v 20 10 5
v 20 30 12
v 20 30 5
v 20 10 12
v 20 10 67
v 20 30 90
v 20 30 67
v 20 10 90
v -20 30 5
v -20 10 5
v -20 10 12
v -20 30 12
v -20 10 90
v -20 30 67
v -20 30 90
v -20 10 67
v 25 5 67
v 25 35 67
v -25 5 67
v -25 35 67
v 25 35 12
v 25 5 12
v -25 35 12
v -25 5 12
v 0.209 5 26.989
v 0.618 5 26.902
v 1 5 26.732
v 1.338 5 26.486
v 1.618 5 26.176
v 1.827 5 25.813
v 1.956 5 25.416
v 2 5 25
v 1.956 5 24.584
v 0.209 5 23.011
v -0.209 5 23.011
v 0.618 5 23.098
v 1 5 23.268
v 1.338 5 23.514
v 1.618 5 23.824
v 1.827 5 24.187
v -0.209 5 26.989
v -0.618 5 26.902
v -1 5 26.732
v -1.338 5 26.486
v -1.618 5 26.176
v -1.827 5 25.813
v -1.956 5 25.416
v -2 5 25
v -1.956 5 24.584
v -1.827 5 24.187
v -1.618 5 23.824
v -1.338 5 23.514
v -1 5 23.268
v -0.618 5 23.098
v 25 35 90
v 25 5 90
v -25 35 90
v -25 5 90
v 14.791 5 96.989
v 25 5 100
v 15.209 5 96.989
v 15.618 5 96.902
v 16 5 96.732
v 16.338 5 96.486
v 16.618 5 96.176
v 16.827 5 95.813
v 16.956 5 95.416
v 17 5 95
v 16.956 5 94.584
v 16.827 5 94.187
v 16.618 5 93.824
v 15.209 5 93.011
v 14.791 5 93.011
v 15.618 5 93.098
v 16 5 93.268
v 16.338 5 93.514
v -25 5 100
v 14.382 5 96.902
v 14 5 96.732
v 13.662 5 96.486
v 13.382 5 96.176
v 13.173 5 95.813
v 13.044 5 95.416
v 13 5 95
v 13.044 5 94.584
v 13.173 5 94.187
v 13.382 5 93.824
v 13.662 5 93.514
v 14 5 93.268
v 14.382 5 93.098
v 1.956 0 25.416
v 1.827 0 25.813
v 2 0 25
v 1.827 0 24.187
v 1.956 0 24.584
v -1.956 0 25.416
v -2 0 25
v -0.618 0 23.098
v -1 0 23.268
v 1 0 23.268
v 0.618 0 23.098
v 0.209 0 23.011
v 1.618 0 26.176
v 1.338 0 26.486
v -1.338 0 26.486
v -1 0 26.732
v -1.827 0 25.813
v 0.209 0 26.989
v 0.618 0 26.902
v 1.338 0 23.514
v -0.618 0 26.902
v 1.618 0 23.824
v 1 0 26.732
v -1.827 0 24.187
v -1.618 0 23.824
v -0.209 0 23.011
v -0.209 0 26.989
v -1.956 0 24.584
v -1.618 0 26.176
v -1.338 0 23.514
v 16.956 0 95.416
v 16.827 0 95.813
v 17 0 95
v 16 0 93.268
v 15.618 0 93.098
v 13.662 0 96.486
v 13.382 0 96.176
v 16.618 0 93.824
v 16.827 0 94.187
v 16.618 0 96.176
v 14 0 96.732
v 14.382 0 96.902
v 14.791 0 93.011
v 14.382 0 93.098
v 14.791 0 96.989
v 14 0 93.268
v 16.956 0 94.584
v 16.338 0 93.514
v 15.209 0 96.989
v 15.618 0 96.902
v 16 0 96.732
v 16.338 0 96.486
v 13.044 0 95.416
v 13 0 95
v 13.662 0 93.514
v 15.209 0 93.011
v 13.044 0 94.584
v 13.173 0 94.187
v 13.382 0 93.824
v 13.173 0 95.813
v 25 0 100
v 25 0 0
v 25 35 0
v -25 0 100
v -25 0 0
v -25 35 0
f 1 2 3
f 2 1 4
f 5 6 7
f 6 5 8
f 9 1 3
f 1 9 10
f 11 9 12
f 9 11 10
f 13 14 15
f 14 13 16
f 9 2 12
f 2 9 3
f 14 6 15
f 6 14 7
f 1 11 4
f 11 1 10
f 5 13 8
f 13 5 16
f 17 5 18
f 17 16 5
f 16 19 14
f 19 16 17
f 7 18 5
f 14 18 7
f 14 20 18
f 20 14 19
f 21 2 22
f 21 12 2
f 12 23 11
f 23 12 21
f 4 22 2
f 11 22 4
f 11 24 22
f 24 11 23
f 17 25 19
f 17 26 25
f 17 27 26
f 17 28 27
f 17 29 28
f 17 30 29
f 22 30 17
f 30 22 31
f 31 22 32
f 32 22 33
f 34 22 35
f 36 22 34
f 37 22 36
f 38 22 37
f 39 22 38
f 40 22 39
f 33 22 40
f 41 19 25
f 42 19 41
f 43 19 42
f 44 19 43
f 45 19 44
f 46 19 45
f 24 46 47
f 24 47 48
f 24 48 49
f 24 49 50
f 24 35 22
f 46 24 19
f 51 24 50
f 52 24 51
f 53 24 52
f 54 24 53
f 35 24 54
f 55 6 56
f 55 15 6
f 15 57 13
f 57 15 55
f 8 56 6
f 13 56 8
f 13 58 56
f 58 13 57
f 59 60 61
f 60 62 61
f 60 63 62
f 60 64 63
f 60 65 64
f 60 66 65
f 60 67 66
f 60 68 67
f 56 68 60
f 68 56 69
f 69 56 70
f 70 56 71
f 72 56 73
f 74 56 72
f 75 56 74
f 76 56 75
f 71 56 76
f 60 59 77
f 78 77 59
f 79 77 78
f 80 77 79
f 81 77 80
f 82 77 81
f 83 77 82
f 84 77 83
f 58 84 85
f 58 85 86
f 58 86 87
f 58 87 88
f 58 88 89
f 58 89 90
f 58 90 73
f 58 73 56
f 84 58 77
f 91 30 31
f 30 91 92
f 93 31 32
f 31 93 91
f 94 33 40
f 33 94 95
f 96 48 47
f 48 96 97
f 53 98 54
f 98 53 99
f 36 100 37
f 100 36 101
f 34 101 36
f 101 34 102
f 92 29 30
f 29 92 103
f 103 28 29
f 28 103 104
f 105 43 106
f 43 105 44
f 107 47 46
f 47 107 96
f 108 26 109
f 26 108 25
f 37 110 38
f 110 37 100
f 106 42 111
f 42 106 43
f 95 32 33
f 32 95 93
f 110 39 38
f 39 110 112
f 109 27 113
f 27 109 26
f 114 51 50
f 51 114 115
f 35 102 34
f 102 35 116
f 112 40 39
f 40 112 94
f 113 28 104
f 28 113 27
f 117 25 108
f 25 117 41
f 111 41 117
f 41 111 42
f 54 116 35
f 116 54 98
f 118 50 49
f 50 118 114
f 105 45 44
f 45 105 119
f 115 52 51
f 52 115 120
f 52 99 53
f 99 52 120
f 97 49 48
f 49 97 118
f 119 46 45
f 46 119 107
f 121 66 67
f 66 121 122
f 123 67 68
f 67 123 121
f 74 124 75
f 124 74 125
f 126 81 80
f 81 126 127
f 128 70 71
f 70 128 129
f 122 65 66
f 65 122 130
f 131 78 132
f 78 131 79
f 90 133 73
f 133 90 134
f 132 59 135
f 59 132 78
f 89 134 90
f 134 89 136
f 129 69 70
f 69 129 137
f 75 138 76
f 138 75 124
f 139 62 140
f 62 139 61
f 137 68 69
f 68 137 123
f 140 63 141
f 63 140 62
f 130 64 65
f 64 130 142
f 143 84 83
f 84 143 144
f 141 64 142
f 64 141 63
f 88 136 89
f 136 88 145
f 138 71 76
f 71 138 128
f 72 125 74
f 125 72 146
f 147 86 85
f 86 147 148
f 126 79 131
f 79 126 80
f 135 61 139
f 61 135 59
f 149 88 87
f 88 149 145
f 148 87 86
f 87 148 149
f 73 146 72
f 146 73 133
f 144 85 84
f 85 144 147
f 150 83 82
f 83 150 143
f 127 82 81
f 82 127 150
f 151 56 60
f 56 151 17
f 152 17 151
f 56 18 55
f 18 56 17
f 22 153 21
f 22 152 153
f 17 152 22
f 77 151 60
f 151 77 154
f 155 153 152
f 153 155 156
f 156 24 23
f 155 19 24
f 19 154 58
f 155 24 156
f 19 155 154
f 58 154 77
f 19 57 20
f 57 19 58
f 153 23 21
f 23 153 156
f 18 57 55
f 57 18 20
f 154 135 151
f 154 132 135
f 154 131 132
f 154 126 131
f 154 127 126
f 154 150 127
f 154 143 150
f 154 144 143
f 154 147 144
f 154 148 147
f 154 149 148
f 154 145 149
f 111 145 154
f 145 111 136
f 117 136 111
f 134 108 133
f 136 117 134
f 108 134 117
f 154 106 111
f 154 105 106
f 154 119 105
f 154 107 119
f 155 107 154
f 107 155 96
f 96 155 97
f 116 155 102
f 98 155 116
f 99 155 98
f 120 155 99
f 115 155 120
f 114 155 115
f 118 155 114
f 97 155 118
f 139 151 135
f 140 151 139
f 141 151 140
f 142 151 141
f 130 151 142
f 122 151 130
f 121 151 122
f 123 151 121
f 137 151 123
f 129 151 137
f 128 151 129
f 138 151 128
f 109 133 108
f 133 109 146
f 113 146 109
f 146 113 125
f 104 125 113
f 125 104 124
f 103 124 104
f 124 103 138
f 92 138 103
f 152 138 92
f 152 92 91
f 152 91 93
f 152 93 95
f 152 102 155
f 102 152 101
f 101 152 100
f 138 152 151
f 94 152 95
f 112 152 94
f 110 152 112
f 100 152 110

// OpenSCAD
module bracket()
{
		difference() {
			union() {
				
				translate([-25, 0, 0])
					cube([50, 35, 100]);

			//	translate([0, 0, 100])				
				//	%cylinder(r=20, h=50, $fn=30); 
			}
		   union() {
				
				translate([-20, 10, 5])
					cube([40, 20, 90]);
				translate([-40, 5, 12])
					cube([80, 40, 55]);
				translate([-40, 5, 90])
					cube([80, 40, 55]);
				translate([0, 8, 25]){				
					rotate([90,0,0]){
						cylinder(r=2, h=10, $fn=30); //6 gauge screw = 3.6 clearence hole
					}
				}
				translate([15, 8, 95]){				
					rotate([90,0,0]){
						cylinder(r=2, h=10, $fn=30); //6 gauge screw = 3.6 clearence hole
					}
				}

			}
		}
}


bracket();
